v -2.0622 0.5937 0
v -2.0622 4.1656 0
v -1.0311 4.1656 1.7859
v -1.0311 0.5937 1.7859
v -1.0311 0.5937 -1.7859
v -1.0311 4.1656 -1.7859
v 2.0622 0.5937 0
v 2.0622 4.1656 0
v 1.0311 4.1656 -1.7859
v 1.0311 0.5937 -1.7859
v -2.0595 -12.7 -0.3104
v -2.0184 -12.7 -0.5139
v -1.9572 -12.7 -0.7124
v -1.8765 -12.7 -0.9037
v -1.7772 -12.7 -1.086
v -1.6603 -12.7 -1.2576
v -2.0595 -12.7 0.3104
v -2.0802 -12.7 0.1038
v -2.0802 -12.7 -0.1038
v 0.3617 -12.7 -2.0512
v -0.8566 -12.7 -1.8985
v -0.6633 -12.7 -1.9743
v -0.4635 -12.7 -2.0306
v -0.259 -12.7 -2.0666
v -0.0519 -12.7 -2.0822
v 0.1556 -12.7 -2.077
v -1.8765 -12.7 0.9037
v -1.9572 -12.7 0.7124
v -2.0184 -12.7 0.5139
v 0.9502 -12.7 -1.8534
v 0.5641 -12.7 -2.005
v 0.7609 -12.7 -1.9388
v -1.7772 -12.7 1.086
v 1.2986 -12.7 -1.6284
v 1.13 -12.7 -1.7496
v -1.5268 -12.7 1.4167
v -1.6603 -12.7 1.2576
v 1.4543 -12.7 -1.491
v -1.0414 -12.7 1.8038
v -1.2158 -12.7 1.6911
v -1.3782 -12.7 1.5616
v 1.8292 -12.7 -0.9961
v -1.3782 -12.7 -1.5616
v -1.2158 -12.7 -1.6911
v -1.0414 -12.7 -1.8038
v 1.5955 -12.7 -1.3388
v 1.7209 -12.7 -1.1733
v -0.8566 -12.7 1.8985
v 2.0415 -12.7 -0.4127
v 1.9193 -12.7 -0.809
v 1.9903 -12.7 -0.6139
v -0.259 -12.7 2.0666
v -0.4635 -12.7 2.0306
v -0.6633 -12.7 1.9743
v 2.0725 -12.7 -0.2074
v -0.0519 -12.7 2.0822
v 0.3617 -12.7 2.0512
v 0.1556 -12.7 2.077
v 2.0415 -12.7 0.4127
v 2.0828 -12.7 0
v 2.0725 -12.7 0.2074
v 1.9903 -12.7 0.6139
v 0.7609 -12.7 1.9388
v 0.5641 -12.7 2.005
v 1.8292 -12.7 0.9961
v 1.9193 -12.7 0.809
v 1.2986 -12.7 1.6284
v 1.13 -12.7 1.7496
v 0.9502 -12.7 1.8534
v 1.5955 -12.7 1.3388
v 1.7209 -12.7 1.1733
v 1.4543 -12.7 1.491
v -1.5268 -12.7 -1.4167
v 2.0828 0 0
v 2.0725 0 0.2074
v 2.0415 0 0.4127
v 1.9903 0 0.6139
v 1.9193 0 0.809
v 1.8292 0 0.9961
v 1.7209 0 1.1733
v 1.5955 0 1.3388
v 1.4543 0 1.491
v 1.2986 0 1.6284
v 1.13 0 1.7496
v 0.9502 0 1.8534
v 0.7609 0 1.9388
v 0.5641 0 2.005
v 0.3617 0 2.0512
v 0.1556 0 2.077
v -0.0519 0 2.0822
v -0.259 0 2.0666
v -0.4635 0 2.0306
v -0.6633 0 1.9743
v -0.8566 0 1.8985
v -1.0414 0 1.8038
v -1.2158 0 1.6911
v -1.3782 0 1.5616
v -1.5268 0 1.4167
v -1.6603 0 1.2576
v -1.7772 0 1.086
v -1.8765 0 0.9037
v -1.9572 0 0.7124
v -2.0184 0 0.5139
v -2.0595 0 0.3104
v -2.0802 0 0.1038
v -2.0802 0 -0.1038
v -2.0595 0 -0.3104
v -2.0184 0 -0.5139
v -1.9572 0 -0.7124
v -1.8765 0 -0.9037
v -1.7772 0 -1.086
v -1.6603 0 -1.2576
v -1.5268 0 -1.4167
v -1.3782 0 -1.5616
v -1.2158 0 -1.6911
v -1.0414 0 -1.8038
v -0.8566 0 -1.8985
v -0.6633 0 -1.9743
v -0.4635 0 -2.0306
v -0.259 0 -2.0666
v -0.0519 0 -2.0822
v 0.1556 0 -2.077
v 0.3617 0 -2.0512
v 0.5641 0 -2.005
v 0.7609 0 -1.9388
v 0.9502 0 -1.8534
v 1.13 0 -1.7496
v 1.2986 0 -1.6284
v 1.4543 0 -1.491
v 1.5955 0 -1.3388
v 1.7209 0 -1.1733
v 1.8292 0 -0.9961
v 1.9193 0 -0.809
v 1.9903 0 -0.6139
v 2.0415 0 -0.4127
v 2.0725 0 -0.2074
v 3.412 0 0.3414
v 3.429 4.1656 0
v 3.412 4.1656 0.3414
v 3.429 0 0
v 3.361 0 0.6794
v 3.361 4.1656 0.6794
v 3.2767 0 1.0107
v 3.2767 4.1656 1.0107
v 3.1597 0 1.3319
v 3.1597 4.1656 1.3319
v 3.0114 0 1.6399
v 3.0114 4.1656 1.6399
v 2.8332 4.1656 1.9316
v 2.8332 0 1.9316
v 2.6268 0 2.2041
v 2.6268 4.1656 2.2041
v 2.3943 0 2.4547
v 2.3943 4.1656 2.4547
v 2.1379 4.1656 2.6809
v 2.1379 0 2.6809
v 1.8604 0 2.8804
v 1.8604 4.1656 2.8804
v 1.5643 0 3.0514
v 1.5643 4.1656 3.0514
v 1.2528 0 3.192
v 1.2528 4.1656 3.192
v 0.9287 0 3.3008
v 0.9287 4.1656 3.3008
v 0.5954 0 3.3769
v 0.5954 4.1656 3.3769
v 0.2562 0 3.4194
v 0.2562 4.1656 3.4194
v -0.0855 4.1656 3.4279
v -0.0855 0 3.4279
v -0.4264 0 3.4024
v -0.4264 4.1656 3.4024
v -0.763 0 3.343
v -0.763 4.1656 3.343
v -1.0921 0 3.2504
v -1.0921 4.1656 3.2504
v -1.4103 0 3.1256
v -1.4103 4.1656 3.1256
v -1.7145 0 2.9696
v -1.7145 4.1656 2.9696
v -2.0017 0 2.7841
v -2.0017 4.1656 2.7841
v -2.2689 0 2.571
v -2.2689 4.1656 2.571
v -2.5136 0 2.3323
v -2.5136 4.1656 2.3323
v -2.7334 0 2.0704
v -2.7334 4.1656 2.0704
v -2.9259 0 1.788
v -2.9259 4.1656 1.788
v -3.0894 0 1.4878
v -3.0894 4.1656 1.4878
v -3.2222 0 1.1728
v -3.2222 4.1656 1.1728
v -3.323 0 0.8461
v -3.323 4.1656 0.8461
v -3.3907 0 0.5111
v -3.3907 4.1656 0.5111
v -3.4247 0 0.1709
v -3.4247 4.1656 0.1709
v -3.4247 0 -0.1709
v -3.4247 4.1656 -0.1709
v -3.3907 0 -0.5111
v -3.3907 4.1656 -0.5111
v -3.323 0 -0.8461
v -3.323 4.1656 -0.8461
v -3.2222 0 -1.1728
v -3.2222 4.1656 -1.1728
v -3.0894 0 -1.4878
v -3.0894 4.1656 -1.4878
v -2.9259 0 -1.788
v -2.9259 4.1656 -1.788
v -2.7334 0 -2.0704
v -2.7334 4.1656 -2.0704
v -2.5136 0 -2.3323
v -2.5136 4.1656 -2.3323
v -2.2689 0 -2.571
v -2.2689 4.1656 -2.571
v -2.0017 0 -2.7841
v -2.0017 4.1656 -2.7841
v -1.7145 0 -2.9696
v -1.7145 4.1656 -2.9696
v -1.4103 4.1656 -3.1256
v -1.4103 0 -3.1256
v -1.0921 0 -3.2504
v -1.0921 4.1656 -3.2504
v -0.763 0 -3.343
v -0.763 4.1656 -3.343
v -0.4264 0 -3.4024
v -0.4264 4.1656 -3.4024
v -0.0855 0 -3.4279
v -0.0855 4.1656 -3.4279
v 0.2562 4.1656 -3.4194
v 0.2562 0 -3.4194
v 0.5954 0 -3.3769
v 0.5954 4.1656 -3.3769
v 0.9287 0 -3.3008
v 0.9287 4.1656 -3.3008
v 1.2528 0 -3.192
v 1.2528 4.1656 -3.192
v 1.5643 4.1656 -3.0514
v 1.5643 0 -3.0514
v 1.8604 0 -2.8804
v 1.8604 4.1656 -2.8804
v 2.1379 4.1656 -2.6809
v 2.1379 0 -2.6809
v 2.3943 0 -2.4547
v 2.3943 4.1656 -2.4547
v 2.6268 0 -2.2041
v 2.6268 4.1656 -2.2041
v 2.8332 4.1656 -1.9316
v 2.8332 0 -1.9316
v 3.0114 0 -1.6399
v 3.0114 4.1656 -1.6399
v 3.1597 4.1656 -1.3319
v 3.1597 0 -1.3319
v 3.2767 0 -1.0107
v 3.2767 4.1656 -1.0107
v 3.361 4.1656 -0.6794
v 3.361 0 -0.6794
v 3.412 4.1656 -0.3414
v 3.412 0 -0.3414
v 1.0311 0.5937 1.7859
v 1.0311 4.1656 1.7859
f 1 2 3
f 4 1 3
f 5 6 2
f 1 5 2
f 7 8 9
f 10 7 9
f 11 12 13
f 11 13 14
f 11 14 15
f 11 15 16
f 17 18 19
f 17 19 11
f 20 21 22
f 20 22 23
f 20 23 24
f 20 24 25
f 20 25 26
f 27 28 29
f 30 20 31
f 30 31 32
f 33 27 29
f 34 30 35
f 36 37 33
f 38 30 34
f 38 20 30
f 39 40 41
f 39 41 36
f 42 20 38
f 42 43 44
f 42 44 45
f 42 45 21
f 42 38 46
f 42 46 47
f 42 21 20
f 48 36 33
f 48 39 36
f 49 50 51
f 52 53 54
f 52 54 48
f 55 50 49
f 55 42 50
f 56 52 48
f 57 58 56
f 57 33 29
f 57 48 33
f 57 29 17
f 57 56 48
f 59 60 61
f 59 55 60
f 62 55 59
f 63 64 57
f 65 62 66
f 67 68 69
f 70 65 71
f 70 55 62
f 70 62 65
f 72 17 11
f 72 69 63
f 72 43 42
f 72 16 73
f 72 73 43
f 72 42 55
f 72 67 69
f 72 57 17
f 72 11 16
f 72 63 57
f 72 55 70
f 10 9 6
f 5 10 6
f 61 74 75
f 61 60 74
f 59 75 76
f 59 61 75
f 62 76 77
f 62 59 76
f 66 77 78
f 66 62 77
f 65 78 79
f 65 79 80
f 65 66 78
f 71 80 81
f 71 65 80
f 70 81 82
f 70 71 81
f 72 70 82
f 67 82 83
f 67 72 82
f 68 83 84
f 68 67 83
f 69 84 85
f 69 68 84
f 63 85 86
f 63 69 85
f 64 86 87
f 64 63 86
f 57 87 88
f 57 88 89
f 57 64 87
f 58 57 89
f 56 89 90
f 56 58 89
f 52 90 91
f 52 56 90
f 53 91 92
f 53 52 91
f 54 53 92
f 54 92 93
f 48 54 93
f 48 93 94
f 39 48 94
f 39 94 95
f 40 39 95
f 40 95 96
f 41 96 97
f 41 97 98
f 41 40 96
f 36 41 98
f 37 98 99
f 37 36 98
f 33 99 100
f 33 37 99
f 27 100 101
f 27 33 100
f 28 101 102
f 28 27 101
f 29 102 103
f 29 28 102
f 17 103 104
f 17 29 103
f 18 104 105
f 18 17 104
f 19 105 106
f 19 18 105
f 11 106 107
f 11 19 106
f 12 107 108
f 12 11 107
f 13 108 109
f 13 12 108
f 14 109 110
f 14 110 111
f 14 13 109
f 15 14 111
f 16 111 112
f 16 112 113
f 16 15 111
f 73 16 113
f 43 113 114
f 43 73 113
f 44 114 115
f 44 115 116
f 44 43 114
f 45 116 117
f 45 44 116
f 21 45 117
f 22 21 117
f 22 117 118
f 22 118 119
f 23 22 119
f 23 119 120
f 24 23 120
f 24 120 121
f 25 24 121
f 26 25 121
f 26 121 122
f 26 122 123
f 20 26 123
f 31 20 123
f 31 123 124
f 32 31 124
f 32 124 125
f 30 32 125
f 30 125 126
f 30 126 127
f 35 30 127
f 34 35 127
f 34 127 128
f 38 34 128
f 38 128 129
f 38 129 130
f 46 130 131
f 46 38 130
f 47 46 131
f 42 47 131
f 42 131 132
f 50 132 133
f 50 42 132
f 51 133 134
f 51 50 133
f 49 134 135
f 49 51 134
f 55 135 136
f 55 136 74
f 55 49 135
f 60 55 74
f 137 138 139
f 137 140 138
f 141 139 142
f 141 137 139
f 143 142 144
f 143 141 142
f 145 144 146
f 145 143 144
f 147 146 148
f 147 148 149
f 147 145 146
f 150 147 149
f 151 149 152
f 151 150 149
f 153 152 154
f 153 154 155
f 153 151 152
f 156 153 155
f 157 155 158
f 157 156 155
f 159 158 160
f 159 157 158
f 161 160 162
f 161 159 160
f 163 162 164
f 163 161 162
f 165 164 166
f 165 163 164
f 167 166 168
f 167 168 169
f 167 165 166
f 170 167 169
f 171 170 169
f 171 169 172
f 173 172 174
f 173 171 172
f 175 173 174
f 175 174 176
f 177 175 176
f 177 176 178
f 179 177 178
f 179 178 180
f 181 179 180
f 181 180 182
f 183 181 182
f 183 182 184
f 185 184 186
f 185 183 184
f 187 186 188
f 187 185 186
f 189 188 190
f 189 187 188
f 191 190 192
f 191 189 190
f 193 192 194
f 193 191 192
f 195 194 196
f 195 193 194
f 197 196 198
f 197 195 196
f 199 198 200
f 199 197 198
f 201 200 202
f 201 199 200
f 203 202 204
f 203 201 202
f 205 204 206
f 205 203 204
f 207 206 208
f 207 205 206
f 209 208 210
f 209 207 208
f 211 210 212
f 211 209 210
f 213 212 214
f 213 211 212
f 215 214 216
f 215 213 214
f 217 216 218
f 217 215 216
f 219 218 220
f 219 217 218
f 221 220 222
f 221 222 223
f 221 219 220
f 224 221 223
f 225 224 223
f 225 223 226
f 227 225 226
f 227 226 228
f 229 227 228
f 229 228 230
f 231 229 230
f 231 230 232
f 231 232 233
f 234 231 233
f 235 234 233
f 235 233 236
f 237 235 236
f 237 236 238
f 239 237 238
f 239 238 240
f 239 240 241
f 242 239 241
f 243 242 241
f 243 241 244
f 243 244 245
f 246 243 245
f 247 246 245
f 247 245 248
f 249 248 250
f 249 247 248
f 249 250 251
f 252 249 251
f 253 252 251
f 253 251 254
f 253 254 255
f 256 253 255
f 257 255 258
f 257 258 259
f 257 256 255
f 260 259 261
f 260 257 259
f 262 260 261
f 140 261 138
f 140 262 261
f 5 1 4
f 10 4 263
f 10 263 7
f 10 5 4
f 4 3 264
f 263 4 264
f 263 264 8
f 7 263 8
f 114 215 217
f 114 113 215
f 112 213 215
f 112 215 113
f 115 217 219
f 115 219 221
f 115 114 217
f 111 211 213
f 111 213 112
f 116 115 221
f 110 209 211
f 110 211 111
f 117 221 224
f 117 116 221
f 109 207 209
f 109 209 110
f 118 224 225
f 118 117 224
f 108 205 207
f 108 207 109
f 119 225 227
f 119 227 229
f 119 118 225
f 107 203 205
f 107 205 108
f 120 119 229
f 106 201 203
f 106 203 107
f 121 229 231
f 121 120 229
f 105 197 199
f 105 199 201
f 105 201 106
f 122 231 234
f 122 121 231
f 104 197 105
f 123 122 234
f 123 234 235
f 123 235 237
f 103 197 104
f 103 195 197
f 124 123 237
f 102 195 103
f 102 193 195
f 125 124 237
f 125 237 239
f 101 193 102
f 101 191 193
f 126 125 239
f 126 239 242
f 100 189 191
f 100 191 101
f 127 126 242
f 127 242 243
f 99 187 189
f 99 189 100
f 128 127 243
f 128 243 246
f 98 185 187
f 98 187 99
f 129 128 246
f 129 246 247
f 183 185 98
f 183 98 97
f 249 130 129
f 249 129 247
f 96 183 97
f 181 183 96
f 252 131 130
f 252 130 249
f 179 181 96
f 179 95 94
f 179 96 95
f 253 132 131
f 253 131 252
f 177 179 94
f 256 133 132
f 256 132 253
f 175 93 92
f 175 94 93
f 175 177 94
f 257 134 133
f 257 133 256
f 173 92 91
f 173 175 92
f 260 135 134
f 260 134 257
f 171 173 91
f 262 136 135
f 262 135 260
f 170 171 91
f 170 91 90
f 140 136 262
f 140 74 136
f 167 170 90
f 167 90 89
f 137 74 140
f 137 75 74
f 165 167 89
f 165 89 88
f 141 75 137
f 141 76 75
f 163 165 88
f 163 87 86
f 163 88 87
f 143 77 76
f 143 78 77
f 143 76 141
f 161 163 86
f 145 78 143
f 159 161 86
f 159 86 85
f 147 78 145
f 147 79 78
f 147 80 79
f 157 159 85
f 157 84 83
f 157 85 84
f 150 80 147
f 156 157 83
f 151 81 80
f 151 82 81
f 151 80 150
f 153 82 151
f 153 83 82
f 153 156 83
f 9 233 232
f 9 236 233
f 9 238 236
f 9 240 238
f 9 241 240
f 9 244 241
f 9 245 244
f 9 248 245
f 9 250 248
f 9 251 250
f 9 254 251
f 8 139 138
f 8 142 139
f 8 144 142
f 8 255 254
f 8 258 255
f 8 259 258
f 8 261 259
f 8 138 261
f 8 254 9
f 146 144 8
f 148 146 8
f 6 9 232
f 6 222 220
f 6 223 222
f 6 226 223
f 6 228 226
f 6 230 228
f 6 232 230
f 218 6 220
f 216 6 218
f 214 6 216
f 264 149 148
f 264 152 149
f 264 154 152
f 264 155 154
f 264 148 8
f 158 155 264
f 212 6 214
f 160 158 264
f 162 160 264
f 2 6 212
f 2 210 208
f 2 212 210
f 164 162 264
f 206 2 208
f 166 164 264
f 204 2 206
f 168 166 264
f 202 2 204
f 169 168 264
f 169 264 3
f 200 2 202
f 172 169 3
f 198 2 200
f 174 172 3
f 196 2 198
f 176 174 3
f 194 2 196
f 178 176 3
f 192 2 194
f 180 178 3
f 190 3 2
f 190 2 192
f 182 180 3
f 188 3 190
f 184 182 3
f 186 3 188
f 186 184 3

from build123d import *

# Parameters (mm, degrees)
CUT_EXTRUDE1_DEPTH = 3.571875


with BuildPart() as part:
    # profiile → Base-Revolve (revolve)
    with BuildSketch(Plane.XY):
        Polygon((0, 4.1656), (3.429, 4.1656), (3.429, 0), (2.0828, 0), (2.0828, -12.7), (0, -12.7), align=None)
    revolve(axis=Axis((0, 9.907210965, 0), (0, -1, 0)))

    # Sketch1 → Cut-Extrude1 (cut)
    with BuildSketch(Plane(origin=(0, 4.1656, 0), x_dir=(1, 0, 0), z_dir=(0, 1, 0))):
        Polygon((2.062222993, 0), (1.031111496, 1.7859375), (-1.031111496, 1.7859375), (-2.062222993, 0), (-1.031111496, -1.7859375), (1.031111496, -1.7859375), align=None)
    extrude(amount=-CUT_EXTRUDE1_DEPTH, mode=Mode.SUBTRACT)


solid = part.part
